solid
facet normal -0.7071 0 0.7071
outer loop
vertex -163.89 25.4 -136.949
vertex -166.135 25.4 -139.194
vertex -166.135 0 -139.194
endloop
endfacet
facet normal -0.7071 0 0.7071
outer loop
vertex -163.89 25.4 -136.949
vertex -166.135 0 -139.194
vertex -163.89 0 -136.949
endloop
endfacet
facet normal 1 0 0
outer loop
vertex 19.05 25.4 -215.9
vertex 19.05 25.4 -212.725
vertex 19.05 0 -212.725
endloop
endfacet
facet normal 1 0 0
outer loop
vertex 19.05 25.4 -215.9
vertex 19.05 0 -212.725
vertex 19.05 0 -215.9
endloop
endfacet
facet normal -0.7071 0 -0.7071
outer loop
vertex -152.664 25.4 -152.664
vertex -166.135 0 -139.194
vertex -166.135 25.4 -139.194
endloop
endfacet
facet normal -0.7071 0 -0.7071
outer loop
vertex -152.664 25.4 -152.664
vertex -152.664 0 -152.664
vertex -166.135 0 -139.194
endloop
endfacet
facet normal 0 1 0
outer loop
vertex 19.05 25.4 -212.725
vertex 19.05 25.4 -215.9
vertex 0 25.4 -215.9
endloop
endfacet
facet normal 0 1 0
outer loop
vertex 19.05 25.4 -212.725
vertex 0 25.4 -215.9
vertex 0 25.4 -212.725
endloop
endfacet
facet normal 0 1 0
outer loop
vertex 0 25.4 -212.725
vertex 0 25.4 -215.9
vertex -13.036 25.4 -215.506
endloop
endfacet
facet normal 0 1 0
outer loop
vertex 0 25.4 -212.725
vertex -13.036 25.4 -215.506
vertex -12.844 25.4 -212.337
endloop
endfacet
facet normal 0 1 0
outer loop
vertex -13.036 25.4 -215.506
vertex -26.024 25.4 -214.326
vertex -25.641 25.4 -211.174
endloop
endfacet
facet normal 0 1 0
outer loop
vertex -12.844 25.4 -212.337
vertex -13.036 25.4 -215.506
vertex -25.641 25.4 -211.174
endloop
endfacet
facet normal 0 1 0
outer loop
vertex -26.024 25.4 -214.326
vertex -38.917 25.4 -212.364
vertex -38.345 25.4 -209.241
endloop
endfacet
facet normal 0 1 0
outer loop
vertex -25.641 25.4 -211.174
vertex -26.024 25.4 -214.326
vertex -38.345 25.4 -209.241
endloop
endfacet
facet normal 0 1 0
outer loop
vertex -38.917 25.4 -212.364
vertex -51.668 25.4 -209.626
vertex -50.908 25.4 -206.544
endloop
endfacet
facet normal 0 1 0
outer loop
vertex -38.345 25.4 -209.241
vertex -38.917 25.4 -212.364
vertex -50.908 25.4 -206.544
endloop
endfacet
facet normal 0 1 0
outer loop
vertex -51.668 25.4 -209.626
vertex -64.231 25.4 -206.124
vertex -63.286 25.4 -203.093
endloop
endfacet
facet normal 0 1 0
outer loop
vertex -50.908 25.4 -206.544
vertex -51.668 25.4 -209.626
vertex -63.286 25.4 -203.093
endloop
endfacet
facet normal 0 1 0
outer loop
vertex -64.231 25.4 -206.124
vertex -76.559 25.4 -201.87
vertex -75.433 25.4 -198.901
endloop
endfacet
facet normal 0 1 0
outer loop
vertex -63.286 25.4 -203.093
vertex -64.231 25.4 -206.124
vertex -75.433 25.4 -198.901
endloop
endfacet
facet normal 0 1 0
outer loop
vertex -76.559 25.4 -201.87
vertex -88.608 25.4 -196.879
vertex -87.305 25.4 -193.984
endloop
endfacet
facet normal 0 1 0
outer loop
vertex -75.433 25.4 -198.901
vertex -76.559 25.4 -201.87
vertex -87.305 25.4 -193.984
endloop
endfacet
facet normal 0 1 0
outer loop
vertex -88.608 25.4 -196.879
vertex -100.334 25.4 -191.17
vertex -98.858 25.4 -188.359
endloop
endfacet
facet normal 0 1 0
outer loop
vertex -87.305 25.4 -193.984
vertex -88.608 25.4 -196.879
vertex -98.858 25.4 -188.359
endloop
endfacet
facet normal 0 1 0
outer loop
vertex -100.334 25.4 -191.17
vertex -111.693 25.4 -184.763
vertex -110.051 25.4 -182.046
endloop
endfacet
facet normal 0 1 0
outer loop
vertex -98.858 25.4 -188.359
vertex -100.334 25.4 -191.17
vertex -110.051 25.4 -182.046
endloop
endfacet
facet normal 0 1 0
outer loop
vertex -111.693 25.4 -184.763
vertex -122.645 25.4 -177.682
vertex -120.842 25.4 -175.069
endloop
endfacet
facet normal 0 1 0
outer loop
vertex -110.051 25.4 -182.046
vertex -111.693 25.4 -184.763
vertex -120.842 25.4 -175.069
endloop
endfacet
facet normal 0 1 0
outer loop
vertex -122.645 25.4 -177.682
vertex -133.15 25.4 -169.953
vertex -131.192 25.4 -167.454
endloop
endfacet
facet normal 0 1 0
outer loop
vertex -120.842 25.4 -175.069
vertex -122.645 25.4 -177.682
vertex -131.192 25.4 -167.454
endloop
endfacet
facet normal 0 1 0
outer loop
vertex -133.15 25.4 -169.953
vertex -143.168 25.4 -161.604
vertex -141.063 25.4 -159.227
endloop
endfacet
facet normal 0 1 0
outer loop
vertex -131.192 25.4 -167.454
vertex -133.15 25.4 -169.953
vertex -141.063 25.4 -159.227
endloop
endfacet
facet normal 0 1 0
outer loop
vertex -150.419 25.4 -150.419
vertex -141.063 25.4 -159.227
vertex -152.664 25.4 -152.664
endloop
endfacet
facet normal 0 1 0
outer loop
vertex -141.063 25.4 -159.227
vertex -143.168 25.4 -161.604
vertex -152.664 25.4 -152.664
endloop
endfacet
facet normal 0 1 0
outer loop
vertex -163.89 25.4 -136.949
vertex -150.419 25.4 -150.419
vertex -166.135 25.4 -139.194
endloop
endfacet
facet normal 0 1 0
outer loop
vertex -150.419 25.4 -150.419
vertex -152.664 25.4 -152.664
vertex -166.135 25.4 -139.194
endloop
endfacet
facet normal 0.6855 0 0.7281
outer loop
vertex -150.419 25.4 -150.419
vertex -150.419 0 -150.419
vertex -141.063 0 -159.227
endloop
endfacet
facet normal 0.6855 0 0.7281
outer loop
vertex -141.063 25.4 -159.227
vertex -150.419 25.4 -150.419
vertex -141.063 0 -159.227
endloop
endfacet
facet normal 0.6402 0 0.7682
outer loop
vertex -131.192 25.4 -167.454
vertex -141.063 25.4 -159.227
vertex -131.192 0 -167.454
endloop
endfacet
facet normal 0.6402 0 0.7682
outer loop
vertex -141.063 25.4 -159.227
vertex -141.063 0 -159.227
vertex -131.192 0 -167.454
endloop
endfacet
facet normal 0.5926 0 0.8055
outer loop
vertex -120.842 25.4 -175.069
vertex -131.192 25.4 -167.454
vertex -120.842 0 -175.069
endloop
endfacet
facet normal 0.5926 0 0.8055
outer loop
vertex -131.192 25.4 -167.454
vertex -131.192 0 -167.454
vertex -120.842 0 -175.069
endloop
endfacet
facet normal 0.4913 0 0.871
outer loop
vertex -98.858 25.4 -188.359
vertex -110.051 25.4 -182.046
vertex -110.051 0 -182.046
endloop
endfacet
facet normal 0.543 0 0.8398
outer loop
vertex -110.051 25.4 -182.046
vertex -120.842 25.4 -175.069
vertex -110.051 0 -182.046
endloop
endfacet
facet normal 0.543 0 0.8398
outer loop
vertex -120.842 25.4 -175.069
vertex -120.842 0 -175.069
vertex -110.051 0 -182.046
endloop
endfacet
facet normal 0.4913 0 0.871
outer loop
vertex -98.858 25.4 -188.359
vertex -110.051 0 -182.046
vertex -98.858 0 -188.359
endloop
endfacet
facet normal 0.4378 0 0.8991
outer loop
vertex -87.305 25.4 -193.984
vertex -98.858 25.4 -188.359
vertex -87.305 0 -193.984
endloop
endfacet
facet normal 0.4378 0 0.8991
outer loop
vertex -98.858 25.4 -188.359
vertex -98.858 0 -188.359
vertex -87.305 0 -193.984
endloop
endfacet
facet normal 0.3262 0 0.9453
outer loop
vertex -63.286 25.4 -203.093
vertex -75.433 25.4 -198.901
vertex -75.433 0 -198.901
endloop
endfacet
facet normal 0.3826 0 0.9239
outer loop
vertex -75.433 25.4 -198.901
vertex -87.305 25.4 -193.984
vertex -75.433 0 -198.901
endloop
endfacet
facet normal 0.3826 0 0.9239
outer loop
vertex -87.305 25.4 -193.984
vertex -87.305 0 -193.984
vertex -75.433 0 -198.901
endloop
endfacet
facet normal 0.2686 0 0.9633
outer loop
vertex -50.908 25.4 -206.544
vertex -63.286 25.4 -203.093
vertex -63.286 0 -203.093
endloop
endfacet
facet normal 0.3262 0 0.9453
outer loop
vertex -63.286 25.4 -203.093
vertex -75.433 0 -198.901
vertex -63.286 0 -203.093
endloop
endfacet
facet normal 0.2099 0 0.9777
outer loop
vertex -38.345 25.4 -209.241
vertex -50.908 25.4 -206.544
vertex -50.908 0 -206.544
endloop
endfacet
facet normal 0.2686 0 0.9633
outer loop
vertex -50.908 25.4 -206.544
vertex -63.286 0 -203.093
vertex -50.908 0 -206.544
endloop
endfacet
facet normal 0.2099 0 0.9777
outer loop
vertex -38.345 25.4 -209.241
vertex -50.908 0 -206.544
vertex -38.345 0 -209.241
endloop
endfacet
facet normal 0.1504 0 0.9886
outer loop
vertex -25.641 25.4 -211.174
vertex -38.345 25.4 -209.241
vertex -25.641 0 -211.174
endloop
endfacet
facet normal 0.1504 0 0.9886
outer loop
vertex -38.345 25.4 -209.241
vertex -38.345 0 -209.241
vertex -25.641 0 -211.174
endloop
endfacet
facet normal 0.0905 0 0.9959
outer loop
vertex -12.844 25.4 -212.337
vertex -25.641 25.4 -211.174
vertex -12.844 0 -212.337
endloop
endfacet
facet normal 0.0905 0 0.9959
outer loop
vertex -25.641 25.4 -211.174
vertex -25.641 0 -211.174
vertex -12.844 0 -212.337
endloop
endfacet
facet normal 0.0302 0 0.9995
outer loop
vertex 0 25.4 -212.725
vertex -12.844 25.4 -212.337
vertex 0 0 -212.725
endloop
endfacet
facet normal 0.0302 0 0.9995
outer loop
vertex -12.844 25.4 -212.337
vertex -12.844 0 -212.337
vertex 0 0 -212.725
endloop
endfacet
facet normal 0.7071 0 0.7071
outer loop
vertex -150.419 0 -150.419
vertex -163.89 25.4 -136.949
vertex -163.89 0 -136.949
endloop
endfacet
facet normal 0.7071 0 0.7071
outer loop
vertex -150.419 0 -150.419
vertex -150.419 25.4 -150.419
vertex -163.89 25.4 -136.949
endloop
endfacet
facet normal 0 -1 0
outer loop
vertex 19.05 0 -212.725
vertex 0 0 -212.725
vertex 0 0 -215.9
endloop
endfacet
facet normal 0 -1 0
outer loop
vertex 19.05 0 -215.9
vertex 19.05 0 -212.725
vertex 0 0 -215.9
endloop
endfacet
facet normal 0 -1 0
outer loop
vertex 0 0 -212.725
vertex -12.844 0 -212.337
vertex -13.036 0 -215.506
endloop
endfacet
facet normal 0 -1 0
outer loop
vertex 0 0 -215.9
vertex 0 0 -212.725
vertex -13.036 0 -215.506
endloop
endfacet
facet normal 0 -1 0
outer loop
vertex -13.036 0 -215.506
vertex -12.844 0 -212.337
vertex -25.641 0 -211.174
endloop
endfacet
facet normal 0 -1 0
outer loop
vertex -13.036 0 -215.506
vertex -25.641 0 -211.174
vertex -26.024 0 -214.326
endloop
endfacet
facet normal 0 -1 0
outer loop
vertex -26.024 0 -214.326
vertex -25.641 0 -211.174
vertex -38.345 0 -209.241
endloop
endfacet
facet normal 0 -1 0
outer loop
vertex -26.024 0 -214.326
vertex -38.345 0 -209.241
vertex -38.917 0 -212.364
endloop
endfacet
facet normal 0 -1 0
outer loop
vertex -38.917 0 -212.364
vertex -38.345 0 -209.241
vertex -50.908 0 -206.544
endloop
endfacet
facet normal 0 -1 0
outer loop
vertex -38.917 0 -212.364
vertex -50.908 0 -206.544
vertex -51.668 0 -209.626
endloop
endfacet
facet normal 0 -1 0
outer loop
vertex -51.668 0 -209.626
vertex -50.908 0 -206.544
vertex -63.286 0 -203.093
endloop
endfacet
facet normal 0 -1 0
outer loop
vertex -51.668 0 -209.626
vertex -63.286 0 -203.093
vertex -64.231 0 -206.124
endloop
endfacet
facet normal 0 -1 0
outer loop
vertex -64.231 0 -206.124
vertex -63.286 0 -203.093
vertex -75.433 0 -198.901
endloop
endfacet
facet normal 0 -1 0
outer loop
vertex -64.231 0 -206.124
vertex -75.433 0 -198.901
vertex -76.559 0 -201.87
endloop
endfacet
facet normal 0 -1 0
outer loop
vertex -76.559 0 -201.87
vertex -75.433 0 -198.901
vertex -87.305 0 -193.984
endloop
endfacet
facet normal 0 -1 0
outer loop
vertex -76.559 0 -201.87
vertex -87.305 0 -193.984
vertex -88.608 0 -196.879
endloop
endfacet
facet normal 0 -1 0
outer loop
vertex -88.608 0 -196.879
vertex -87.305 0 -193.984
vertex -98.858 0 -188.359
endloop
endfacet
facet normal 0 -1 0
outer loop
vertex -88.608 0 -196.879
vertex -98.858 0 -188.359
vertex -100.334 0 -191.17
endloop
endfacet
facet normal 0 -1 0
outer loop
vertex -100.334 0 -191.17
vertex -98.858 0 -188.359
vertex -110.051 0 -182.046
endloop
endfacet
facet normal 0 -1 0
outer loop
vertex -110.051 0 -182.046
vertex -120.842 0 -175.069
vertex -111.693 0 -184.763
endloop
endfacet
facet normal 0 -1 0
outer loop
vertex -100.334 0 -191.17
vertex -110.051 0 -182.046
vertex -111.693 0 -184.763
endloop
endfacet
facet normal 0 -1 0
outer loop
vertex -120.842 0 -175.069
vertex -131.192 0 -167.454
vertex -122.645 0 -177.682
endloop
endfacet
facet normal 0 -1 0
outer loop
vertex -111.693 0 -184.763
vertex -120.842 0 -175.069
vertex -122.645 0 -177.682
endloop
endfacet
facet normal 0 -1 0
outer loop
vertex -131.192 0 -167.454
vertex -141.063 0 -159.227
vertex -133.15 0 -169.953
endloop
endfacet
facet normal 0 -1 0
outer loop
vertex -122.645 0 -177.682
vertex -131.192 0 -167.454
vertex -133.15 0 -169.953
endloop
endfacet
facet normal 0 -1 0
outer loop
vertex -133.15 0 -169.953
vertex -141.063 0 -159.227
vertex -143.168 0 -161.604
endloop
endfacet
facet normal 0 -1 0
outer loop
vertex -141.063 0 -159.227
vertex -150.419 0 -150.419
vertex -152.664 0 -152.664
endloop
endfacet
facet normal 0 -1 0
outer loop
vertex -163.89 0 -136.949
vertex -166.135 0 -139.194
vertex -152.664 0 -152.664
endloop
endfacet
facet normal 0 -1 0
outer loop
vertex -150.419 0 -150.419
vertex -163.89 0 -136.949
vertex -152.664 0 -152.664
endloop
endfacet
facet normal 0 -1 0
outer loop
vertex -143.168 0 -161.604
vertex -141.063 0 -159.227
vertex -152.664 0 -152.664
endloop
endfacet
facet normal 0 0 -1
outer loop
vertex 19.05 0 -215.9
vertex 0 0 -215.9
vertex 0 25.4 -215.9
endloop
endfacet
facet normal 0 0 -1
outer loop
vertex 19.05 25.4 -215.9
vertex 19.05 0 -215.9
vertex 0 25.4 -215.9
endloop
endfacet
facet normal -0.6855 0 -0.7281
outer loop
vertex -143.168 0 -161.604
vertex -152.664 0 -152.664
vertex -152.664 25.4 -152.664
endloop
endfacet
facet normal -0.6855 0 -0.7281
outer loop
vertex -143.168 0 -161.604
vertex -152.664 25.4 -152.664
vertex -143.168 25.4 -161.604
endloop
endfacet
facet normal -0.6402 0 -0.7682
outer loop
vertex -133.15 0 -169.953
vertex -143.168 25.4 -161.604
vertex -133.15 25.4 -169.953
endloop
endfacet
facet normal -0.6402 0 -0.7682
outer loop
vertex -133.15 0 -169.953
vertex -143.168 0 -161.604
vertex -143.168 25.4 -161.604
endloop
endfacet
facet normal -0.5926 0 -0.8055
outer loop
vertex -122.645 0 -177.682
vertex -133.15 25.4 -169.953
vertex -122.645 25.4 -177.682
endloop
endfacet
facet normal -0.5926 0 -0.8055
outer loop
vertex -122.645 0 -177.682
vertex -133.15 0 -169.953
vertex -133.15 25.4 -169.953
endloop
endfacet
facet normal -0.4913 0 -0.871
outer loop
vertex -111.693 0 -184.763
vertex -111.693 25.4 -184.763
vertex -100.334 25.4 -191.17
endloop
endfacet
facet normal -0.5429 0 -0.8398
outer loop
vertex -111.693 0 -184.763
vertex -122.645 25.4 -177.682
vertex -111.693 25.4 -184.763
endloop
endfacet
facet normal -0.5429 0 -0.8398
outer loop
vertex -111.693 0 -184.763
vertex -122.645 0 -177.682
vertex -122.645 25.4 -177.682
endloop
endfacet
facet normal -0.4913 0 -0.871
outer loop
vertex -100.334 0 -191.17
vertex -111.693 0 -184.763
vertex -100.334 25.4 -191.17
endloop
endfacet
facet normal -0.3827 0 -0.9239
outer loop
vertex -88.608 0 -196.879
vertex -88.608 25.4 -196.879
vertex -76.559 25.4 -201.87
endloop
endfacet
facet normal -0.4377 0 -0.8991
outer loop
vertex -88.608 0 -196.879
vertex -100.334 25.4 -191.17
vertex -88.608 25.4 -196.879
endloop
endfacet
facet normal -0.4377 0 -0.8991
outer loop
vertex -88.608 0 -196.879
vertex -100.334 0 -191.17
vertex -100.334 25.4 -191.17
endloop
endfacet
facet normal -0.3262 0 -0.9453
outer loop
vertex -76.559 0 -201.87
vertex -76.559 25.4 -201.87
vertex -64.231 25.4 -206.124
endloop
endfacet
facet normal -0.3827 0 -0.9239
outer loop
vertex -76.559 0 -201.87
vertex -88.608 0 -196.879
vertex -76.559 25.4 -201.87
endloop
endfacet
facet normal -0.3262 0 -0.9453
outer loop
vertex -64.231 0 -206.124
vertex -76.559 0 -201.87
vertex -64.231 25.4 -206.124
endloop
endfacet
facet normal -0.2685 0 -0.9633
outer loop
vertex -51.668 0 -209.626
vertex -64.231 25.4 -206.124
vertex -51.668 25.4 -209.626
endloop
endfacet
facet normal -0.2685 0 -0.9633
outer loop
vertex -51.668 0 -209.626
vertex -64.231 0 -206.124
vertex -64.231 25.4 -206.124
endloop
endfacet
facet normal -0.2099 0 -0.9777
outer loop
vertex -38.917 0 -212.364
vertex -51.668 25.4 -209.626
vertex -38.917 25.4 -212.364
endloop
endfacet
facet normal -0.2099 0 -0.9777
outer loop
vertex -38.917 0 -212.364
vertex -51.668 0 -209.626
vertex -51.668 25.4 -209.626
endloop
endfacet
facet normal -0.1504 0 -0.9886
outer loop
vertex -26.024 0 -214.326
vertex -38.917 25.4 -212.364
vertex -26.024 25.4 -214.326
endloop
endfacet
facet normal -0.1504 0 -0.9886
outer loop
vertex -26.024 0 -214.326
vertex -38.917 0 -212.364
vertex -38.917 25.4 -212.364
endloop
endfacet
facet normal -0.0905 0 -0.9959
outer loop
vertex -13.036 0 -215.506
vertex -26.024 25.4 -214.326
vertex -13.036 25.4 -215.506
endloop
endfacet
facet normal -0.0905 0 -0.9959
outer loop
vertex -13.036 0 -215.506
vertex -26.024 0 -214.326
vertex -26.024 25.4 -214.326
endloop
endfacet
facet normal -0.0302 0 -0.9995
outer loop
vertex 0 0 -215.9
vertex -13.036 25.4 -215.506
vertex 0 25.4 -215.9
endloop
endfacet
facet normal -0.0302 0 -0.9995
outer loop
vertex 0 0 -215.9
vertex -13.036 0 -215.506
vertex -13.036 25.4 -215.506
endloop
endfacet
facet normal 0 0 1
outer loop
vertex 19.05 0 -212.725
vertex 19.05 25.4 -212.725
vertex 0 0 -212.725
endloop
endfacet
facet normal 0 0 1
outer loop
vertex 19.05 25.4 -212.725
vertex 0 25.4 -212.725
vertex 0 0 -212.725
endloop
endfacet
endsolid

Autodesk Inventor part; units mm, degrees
ref_plane "YZ Plane" through (0, 0, 0) normal (1, 0, 0) x (0, 1, 0)
ref_plane "XZ Plane" through (0, 0, 0) normal (0, 1, 0) x (-1, 0, 0)
ref_plane "XY Plane" through (0, 0, 0) normal (0, 0, 1) x (1, 0, 0)
sketch "Sketch1" plane through (0, 0, 0) normal (0, 1, 0) x (-1, 0, 0)
  arc A0 (0, -215.9) -> (152.6644, -152.6644) centre (0, 0) ccw
  arc A1 (0, -212.725) -> (150.4193, -150.4193) centre (0, 0) ccw
  line L0 (150.4193, -150.4193) -> (152.6644, -152.6644)
  line L1 (0, -212.725) -> (0, -215.9)
  dimension "d0" = 431.8
  dimension "d1" = 3.175
  dimension "d2" = 45
extrude "Extrusion1" add sketch "Sketch1" along normal blind 25.4
sketch "Sketch2" plane through (-150.4193, 0, -150.4193) normal (-0.7071, 0, 0.7071) x (0.7071, 0, 0.7071)
  line L0 (-3.175, 25.4) -> (0, 25.4)
  line L1 (0, 25.4) -> (0, 0)
  line L2 (0, 0) -> (-3.175, 0)
  line L3 (-3.175, 0) -> (-3.175, 25.4)
  point P0 (212.725, 0)
extrude "Extrusion2" add sketch "Sketch2" along normal blind 19.05
sketch "Sketch3" plane through (0, 0, -212.725) normal (1, 0, 0) x (0, 0, -1)
  line L0 (0, 0) -> (3.175, 0)
  line L1 (3.175, 0) -> (3.175, 25.4)
  line L2 (3.175, 25.4) -> (0, 25.4)
  line L3 (0, 25.4) -> (0, 0)
  point P0 (-212.725, 0)
extrude "Extrusion3" add sketch "Sketch3" along normal blind 19.05
properties part number "rail"
